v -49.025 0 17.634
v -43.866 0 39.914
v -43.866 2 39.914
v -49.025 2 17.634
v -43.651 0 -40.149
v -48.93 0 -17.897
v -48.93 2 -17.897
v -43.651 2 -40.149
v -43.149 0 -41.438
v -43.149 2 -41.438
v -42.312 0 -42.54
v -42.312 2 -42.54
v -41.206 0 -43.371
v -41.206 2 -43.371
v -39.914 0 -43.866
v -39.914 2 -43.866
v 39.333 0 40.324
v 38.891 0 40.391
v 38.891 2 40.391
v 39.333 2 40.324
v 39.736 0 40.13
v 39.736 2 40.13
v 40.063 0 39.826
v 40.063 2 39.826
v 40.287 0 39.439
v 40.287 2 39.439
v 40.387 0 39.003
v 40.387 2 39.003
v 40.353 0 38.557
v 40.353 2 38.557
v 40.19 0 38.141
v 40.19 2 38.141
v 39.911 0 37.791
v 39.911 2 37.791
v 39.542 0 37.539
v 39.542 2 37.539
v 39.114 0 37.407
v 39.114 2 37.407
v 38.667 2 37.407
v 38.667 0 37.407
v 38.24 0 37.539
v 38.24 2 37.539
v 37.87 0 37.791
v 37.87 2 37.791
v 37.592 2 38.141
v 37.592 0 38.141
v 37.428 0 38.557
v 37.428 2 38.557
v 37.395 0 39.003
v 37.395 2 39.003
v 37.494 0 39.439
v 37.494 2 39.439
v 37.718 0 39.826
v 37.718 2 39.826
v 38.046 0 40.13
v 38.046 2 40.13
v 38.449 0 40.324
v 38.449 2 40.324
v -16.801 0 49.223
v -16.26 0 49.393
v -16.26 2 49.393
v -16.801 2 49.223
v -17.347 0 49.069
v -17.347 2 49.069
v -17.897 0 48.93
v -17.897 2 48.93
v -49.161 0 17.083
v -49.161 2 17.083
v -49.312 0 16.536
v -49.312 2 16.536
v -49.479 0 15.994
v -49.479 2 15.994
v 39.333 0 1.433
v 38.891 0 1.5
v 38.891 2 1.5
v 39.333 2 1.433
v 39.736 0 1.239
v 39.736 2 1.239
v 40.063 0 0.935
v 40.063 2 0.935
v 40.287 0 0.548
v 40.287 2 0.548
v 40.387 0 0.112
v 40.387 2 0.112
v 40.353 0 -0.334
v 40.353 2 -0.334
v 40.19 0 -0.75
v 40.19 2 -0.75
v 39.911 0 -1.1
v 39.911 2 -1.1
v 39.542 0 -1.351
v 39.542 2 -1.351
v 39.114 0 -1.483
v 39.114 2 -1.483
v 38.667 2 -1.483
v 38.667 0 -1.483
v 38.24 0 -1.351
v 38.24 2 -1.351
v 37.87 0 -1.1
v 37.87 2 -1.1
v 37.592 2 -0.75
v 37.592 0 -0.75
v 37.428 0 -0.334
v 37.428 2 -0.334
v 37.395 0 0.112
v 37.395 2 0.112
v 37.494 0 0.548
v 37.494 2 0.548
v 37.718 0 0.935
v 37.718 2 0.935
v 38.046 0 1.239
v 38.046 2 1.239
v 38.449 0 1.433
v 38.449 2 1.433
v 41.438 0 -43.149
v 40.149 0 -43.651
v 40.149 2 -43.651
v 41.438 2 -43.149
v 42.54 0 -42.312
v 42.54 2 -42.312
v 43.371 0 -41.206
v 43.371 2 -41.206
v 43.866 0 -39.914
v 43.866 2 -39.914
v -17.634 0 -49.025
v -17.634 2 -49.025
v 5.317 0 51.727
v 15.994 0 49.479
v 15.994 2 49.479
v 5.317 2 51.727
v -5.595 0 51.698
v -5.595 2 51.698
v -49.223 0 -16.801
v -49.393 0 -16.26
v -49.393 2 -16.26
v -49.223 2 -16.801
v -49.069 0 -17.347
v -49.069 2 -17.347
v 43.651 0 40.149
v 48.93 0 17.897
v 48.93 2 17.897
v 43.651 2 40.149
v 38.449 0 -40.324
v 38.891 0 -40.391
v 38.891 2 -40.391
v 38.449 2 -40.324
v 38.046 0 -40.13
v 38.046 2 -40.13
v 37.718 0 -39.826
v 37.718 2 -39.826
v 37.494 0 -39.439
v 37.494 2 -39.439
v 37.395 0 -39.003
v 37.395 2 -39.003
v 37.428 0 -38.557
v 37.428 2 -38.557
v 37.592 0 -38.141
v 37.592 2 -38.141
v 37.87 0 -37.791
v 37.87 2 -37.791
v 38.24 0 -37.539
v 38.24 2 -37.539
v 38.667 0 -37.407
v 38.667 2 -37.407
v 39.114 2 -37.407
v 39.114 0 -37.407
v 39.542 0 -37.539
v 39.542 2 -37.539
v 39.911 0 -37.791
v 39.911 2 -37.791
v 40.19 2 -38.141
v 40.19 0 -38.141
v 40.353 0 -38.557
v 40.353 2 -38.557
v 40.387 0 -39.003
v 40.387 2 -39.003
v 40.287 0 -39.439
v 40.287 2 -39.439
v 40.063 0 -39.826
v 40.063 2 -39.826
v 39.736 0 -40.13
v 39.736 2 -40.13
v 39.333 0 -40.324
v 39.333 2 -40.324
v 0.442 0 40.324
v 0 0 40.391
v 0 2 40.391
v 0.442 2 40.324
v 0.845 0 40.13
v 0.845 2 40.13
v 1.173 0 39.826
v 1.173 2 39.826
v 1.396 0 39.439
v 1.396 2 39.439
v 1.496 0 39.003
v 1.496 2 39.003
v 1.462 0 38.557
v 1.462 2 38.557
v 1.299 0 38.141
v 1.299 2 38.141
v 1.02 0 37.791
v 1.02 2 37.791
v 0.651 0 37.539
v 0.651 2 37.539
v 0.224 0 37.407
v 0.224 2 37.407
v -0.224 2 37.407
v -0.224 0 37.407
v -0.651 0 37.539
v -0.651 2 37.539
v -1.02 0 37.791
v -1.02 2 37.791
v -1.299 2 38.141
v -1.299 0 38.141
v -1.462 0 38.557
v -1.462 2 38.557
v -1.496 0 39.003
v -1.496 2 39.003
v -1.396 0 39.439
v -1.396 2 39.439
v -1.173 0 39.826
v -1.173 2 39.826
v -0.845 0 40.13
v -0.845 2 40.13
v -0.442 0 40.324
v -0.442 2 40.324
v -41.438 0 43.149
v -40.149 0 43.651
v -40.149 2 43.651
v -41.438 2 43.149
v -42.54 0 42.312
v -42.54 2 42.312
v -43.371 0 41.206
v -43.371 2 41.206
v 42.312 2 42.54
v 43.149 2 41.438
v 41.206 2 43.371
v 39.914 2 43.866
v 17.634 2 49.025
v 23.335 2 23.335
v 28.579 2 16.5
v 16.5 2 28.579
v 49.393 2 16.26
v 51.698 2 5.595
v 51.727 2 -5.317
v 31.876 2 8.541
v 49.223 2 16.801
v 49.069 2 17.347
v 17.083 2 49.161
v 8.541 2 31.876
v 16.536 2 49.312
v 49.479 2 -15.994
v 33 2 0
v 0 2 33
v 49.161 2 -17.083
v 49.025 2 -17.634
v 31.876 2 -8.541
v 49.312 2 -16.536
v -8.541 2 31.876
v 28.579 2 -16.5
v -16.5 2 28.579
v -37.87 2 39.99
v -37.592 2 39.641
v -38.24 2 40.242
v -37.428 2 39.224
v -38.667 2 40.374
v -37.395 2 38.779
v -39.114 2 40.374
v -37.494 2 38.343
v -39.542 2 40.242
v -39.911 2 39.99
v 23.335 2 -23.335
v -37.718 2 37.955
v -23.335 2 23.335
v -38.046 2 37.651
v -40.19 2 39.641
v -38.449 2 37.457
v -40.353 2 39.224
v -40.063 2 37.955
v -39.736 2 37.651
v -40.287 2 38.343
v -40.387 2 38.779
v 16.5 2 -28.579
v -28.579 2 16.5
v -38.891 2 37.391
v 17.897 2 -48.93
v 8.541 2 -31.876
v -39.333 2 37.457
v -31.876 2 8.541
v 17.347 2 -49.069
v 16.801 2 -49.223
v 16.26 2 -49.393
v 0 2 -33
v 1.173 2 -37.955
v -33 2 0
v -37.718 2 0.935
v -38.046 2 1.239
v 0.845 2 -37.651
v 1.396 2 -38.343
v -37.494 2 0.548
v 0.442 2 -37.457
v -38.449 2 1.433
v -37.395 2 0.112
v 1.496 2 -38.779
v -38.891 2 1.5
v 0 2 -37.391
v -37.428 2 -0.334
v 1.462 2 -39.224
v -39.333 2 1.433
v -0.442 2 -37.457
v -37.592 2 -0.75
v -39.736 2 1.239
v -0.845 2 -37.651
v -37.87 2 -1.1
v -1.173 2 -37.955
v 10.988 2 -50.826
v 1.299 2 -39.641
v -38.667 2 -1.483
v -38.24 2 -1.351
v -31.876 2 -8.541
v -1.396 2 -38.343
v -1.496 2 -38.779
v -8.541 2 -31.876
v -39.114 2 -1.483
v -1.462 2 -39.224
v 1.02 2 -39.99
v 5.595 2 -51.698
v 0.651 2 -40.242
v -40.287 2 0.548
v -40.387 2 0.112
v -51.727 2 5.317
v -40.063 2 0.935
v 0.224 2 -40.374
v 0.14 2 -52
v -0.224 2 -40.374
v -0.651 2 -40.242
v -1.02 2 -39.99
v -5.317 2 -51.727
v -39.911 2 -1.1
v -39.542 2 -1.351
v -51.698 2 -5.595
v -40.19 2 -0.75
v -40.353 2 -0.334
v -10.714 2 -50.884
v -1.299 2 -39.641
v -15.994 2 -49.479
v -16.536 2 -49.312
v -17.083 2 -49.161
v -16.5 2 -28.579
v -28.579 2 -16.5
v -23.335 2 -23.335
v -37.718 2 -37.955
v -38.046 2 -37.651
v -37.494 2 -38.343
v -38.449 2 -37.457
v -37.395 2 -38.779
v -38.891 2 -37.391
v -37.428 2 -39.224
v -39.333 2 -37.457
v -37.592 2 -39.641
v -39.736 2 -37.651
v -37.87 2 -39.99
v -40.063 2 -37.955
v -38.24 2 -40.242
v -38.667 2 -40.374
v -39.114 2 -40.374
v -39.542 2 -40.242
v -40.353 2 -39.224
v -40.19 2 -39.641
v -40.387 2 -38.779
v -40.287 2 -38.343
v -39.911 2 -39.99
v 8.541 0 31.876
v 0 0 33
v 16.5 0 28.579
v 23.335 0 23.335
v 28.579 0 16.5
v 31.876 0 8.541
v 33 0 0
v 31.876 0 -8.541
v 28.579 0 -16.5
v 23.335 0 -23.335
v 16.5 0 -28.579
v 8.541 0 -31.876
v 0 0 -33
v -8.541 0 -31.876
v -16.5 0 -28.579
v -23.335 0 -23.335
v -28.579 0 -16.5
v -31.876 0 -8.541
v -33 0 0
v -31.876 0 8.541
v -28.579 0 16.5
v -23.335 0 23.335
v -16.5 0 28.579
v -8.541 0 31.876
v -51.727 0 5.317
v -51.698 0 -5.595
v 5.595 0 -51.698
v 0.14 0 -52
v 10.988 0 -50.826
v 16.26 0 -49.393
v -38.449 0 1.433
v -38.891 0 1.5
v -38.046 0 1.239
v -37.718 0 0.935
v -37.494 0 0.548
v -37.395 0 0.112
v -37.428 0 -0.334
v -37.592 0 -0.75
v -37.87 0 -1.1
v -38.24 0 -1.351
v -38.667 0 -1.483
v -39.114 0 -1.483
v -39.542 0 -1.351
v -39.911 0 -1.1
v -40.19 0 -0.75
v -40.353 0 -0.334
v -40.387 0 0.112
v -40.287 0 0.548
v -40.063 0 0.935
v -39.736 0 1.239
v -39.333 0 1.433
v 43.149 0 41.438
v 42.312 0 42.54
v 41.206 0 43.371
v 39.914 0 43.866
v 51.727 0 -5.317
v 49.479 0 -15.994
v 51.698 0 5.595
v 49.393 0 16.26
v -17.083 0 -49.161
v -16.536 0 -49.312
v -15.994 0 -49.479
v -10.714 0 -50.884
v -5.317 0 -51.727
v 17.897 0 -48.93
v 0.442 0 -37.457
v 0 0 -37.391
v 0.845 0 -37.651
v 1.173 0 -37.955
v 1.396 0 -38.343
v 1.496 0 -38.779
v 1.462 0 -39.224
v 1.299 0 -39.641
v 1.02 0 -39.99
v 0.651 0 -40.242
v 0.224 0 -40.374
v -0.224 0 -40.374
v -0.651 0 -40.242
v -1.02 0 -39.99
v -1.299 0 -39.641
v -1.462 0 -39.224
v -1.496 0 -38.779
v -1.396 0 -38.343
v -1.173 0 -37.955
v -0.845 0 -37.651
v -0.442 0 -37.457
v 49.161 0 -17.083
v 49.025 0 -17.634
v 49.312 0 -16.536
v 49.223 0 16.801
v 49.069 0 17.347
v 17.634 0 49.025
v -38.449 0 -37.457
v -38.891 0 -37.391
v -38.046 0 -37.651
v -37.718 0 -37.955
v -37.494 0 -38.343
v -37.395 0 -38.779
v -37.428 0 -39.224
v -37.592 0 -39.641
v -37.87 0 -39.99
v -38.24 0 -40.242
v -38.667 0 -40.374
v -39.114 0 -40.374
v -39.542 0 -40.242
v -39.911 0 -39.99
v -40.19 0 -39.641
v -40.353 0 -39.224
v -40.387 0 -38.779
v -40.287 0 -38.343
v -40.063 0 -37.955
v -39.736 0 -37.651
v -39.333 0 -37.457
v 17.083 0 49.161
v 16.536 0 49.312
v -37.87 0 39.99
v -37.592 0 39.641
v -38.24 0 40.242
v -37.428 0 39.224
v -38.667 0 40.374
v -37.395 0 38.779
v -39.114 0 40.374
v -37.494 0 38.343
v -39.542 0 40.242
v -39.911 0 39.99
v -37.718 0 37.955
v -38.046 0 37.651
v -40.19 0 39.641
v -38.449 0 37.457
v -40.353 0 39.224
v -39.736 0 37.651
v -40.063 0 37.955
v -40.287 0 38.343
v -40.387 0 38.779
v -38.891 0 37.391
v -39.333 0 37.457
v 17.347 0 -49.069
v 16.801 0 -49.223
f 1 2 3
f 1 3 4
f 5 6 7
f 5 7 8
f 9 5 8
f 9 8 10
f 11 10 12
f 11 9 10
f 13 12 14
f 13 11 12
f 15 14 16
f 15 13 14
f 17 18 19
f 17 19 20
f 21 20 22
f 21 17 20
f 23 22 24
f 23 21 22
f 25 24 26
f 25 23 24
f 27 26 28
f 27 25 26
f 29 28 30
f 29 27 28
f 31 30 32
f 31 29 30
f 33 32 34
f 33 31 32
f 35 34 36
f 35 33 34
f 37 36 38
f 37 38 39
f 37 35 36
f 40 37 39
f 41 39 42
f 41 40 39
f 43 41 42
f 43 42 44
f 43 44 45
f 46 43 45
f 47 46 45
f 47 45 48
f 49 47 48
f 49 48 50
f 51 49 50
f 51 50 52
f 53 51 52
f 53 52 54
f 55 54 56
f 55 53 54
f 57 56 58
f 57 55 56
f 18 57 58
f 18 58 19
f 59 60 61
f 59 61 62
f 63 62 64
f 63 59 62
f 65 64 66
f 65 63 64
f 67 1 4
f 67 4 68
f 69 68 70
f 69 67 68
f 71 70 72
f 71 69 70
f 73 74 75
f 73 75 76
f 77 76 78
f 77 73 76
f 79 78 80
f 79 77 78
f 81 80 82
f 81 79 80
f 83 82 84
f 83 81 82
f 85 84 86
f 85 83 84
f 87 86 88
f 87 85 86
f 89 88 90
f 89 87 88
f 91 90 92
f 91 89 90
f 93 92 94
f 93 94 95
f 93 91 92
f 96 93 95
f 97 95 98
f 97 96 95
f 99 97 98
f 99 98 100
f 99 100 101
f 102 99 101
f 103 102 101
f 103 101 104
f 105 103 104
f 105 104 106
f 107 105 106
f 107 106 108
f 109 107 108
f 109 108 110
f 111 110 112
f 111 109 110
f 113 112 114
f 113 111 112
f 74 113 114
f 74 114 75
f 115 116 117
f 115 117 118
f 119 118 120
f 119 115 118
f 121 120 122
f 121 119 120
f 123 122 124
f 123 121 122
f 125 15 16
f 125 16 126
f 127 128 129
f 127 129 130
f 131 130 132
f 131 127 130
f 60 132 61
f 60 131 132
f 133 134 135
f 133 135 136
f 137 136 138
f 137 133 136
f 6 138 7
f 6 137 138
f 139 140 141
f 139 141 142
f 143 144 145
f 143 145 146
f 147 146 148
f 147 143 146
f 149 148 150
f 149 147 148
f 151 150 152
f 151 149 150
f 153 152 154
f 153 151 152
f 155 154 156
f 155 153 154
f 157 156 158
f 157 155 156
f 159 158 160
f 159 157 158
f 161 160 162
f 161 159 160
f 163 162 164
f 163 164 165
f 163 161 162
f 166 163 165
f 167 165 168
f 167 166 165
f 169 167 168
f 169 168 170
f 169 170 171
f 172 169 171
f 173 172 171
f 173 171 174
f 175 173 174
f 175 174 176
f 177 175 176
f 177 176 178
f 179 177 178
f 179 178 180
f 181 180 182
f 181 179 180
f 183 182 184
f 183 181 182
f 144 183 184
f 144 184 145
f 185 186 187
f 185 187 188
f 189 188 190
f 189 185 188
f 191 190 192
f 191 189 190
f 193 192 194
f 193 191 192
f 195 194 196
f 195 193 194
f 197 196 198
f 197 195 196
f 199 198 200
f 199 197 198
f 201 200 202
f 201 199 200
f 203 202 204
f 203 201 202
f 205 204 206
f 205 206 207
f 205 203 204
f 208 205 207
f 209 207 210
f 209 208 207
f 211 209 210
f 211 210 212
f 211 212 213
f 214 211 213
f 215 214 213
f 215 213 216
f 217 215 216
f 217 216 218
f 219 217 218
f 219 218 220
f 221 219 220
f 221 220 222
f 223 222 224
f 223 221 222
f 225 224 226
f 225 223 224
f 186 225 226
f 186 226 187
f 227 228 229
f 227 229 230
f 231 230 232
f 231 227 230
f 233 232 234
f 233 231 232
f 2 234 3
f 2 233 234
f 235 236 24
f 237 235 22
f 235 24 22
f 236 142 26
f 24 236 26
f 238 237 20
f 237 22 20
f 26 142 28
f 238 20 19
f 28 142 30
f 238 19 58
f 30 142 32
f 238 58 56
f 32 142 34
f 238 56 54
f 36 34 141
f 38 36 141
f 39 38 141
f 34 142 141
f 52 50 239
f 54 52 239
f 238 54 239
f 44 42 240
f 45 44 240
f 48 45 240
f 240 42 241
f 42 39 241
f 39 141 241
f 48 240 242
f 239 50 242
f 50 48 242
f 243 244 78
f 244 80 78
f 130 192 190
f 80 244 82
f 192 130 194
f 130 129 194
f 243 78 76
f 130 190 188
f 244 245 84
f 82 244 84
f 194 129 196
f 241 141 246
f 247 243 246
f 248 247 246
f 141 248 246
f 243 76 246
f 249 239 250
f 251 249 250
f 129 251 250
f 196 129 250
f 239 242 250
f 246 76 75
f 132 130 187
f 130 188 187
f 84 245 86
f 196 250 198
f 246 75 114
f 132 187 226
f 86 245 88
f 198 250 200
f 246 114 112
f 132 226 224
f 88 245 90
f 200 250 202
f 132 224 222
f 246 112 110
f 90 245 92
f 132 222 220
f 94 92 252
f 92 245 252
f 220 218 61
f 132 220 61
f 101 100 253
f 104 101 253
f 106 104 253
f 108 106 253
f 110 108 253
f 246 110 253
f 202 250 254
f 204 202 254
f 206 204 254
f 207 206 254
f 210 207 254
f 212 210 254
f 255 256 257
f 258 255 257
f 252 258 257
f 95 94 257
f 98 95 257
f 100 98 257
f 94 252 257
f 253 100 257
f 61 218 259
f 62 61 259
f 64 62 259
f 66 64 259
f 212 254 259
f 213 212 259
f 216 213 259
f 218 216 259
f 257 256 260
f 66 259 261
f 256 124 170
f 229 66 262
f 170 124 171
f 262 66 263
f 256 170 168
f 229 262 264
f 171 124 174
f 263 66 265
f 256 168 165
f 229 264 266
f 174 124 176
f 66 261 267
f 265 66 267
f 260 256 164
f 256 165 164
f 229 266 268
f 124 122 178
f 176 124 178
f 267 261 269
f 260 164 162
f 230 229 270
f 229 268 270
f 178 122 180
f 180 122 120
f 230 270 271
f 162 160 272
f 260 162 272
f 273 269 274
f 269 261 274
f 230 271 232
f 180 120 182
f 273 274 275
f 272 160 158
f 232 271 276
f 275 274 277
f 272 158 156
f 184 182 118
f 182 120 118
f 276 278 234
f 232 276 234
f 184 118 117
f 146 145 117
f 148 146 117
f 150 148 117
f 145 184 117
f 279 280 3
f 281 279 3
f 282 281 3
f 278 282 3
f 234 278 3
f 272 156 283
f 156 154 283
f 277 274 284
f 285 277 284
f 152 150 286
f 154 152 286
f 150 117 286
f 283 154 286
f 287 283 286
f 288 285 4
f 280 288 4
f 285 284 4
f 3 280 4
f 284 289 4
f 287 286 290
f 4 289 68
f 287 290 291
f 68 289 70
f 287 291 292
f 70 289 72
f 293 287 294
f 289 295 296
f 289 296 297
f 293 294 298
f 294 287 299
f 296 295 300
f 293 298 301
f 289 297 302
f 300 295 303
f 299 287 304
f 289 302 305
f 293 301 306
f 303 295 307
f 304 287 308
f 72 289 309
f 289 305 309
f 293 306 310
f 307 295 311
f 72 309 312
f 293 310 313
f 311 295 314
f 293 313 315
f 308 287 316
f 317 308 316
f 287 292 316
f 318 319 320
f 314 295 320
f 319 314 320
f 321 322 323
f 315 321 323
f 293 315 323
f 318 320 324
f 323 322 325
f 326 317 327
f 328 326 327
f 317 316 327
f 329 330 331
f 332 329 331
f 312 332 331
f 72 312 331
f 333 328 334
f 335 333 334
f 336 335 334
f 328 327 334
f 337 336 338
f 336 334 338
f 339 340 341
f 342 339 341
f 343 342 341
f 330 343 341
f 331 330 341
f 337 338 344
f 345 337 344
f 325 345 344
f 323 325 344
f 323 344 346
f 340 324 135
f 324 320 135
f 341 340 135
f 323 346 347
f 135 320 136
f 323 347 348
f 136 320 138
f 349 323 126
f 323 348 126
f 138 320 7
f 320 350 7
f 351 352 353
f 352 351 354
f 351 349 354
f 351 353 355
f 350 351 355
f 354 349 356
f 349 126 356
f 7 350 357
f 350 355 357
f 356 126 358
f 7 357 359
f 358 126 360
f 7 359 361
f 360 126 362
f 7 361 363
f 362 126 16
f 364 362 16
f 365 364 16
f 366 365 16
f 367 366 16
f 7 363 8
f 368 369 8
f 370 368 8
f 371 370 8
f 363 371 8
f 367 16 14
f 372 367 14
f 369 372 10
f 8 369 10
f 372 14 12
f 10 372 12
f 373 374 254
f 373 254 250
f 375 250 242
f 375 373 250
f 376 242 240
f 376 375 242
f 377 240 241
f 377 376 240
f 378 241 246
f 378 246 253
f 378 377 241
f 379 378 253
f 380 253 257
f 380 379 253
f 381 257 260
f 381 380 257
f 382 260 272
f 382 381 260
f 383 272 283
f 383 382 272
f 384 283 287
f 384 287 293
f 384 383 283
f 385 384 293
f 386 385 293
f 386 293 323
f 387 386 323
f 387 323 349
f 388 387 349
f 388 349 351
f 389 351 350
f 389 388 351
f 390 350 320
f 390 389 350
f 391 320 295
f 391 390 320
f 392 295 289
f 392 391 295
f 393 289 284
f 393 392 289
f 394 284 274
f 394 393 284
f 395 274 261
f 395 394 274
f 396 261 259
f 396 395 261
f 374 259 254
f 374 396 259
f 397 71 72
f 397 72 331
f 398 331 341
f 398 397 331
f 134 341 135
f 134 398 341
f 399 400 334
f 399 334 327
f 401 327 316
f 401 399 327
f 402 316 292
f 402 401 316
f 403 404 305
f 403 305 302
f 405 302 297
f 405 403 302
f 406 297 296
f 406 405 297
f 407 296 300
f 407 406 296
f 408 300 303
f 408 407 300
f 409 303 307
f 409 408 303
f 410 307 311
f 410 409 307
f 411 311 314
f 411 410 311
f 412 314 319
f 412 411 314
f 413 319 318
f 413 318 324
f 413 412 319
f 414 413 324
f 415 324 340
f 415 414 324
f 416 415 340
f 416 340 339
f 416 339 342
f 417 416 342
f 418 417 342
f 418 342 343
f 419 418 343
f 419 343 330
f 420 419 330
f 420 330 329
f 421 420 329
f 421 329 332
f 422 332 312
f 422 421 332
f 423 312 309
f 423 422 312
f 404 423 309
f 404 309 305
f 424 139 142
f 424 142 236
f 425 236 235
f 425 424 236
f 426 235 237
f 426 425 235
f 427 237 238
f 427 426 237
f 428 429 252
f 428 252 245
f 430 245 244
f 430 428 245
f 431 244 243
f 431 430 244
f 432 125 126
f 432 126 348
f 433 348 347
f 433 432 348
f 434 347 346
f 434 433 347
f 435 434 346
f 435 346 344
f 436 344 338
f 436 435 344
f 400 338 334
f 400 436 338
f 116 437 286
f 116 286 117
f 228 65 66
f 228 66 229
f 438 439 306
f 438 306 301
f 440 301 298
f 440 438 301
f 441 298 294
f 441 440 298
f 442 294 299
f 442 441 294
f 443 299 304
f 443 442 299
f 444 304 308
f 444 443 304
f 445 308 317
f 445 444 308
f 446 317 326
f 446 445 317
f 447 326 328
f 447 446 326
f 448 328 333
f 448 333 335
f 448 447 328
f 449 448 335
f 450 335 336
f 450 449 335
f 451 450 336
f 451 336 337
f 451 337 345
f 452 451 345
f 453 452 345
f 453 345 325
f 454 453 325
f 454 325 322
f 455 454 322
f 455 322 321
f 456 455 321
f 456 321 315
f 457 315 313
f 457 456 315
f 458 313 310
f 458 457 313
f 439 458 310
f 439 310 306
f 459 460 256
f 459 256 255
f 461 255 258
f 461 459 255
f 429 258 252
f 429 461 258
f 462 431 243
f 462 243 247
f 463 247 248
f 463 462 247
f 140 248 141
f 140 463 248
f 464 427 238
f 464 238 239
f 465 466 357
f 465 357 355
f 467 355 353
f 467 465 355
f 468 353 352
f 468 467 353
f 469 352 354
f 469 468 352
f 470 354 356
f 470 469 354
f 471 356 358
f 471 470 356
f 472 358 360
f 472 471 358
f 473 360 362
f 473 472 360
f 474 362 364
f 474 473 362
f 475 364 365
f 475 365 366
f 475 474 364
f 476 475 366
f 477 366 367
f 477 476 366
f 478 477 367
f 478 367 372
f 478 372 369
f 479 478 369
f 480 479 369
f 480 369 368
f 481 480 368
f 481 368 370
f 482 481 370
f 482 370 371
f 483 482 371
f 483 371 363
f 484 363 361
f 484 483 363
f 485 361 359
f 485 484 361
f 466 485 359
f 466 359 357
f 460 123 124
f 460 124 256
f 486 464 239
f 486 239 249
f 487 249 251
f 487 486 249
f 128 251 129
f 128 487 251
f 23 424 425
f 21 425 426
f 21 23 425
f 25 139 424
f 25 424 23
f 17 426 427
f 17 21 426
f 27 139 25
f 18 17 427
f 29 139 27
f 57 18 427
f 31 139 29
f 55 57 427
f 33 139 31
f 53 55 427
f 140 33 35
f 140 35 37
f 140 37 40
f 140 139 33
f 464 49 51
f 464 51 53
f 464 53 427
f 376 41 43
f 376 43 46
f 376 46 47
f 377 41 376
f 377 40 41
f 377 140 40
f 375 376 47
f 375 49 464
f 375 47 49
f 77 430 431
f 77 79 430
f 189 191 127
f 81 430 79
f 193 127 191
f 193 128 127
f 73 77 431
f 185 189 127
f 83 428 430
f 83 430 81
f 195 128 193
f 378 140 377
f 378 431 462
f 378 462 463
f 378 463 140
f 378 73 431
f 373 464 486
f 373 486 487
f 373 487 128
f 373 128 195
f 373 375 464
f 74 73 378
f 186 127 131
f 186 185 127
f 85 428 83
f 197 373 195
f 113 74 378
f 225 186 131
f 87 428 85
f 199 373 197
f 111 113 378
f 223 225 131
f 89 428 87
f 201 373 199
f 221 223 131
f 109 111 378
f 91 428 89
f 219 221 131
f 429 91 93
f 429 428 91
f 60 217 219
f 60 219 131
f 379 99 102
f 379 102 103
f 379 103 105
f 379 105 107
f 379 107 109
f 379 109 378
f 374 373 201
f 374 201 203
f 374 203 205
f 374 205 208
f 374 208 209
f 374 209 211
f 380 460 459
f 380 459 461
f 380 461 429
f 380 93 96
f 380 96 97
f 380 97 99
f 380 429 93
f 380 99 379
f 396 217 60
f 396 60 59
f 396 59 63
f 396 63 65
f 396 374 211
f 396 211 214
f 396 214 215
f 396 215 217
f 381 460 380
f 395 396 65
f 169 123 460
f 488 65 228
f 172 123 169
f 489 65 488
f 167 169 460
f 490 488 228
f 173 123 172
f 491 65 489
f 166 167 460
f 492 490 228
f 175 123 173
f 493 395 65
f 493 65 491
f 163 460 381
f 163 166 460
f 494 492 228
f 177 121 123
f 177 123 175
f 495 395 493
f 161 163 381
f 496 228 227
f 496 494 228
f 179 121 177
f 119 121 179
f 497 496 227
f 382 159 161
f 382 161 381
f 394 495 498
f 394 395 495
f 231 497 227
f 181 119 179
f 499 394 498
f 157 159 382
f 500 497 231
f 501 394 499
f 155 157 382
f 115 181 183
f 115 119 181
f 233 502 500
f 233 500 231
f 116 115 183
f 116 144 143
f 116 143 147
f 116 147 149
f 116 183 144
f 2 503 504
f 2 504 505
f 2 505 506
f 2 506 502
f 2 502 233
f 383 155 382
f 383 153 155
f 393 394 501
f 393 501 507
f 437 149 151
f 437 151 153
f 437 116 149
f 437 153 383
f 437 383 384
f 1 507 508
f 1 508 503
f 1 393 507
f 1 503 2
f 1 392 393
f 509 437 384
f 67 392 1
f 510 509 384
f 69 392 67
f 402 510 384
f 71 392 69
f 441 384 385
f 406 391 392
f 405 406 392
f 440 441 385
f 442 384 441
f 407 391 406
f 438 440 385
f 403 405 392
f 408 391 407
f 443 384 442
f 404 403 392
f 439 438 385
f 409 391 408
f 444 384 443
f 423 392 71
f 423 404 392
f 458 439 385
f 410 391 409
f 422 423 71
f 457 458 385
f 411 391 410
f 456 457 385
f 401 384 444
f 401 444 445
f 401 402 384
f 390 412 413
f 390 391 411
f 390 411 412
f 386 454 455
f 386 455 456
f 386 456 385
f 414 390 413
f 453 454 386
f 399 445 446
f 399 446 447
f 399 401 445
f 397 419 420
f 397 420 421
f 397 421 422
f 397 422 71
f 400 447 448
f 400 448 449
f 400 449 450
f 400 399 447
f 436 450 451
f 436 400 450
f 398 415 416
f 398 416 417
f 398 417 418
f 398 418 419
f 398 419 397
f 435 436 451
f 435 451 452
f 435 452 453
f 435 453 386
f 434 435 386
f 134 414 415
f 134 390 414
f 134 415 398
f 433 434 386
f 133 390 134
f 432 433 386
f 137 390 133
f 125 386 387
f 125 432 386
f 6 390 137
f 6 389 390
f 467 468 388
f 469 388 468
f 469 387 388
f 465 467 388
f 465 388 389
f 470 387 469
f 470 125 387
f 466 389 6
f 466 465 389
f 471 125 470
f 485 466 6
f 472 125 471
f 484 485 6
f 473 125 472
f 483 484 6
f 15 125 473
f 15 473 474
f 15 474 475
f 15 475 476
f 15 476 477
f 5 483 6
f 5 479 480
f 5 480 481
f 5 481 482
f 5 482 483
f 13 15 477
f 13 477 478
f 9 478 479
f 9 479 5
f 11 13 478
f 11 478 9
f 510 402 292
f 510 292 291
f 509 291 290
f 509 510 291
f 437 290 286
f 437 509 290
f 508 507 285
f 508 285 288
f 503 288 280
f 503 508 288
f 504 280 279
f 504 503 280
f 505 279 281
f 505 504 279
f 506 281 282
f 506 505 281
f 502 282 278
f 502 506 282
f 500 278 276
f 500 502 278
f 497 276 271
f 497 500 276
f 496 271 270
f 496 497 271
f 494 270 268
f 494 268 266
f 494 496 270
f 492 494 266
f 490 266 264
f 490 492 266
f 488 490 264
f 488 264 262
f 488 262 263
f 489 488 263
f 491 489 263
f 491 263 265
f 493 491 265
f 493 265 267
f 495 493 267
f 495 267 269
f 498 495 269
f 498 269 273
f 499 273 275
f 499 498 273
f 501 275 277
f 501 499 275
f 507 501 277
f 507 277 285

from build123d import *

# Parameters (mm, degrees)
SKETCH2_R           = 1.5
SKETCH2_R_2         = 33
BOSS_EXTRUDE1_DEPTH = 2


with BuildPart() as part:
    # Sketch2 → Boss-Extrude1 (new body)
    with BuildSketch(Plane(origin=(0, 0, 0), x_dir=(1, 0, 0), z_dir=(0, 1, 0))):
        with BuildLine():
            Line((17.897079586, 48.929734976), (40.149284407, 43.651218265))
            ThreePointArc((40.149284407, 43.651218265), (42.540265174, 42.312242187), (43.866371506, 39.91409958))
            Line((43.866371506, 39.91409958), (49.02521675, 17.633846579))
            ThreePointArc((49.02521675, 17.633846579), (49.23478351, 16.809026698), (49.479249782, 15.993868858))
            ThreePointArc((49.479249782, 15.993868858), (51.999812242, -0.139738387), (49.392575566, -16.259565766))
            ThreePointArc((49.392575566, -16.259565766), (49.143731732, -17.073397941), (48.929734976, -17.897079586))
            Line((48.929734976, -17.897079586), (43.651218265, -40.149284407))
            ThreePointArc((43.651218265, -40.149284407), (42.312242187, -42.540265174), (39.91409958, -43.866371506))
            Line((39.91409958, -43.866371506), (17.633846579, -49.02521675))
            ThreePointArc((17.633846579, -49.02521675), (16.809026698, -49.23478351), (15.993868858, -49.479249782))
            ThreePointArc((15.993868858, -49.479249782), (-0.139738387, -51.999812242), (-16.259565766, -49.392575566))
            ThreePointArc((-16.259565766, -49.392575566), (-17.073397941, -49.143731732), (-17.897079586, -48.929734976))
            Line((-17.897079586, -48.929734976), (-40.149284407, -43.651218265))
            ThreePointArc((-40.149284407, -43.651218265), (-42.540265174, -42.312242187), (-43.866371506, -39.91409958))
            Line((-43.866371506, -39.91409958), (-49.02521675, -17.633846579))
            ThreePointArc((-49.02521675, -17.633846579), (-49.23478351, -16.809026698), (-49.479249782, -15.993868858))
            ThreePointArc((-49.479249782, -15.993868858), (-51.999812242, 0.139738387), (-49.392575566, 16.259565766))
            ThreePointArc((-49.392575566, 16.259565766), (-49.143731732, 17.073397941), (-48.929734976, 17.897079586))
            Line((-48.929734976, 17.897079586), (-43.651218265, 40.149284407))
            ThreePointArc((-43.651218265, 40.149284407), (-42.312242187, 42.540265174), (-39.91409958, 43.866371506))
            Line((-39.91409958, 43.866371506), (-17.633846579, 49.02521675))
            ThreePointArc((-17.633846579, 49.02521675), (-16.809026698, 49.23478351), (-15.993868858, 49.479249782))
            ThreePointArc((-15.993868858, 49.479249782), (-8.026622704, 51.3767781), (0.139738387, 51.999812242))
            ThreePointArc((0.139738387, 51.999812242), (8.302633013, 51.332896714), (16.259565766, 49.392575566))
            ThreePointArc((16.259565766, 49.392575566), (17.073397941, 49.143731732), (17.897079586, 48.929734976))
        make_face()
        with Locations(Location((-38.8907, 38.8907, 0), (0, 0, 270))):
            Circle(SKETCH2_R, mode=Mode.SUBTRACT)
        with Locations(Location((38.8907, 38.8907, 0), (0, 0, 90))):
            Circle(SKETCH2_R, mode=Mode.SUBTRACT)
        with Locations(Location((38.8907, -38.8907, 0), (0, 0, 270))):
            Circle(SKETCH2_R, mode=Mode.SUBTRACT)
        with Locations(Location((-38.8907, -38.8907, 0), (0, 0, 90))):
            Circle(SKETCH2_R, mode=Mode.SUBTRACT)
        with Locations(Location((0, 0, 0), (0, 0, 270))):
            Circle(SKETCH2_R_2, mode=Mode.SUBTRACT)
        with Locations(Location((0, 38.8907, 0), (0, 0, 270))):
            Circle(SKETCH2_R, mode=Mode.SUBTRACT)
        with Locations(Location((38.8907, 0, 0), (0, 0, 270))):
            Circle(SKETCH2_R, mode=Mode.SUBTRACT)
        with Locations(Location((0, -38.8907, 0), (0, 0, 270))):
            Circle(SKETCH2_R, mode=Mode.SUBTRACT)
        with Locations(Location((-38.8907, 0, 0), (0, 0, 270))):
            Circle(SKETCH2_R, mode=Mode.SUBTRACT)
    extrude(amount=BOSS_EXTRUDE1_DEPTH)


solid = part.part
